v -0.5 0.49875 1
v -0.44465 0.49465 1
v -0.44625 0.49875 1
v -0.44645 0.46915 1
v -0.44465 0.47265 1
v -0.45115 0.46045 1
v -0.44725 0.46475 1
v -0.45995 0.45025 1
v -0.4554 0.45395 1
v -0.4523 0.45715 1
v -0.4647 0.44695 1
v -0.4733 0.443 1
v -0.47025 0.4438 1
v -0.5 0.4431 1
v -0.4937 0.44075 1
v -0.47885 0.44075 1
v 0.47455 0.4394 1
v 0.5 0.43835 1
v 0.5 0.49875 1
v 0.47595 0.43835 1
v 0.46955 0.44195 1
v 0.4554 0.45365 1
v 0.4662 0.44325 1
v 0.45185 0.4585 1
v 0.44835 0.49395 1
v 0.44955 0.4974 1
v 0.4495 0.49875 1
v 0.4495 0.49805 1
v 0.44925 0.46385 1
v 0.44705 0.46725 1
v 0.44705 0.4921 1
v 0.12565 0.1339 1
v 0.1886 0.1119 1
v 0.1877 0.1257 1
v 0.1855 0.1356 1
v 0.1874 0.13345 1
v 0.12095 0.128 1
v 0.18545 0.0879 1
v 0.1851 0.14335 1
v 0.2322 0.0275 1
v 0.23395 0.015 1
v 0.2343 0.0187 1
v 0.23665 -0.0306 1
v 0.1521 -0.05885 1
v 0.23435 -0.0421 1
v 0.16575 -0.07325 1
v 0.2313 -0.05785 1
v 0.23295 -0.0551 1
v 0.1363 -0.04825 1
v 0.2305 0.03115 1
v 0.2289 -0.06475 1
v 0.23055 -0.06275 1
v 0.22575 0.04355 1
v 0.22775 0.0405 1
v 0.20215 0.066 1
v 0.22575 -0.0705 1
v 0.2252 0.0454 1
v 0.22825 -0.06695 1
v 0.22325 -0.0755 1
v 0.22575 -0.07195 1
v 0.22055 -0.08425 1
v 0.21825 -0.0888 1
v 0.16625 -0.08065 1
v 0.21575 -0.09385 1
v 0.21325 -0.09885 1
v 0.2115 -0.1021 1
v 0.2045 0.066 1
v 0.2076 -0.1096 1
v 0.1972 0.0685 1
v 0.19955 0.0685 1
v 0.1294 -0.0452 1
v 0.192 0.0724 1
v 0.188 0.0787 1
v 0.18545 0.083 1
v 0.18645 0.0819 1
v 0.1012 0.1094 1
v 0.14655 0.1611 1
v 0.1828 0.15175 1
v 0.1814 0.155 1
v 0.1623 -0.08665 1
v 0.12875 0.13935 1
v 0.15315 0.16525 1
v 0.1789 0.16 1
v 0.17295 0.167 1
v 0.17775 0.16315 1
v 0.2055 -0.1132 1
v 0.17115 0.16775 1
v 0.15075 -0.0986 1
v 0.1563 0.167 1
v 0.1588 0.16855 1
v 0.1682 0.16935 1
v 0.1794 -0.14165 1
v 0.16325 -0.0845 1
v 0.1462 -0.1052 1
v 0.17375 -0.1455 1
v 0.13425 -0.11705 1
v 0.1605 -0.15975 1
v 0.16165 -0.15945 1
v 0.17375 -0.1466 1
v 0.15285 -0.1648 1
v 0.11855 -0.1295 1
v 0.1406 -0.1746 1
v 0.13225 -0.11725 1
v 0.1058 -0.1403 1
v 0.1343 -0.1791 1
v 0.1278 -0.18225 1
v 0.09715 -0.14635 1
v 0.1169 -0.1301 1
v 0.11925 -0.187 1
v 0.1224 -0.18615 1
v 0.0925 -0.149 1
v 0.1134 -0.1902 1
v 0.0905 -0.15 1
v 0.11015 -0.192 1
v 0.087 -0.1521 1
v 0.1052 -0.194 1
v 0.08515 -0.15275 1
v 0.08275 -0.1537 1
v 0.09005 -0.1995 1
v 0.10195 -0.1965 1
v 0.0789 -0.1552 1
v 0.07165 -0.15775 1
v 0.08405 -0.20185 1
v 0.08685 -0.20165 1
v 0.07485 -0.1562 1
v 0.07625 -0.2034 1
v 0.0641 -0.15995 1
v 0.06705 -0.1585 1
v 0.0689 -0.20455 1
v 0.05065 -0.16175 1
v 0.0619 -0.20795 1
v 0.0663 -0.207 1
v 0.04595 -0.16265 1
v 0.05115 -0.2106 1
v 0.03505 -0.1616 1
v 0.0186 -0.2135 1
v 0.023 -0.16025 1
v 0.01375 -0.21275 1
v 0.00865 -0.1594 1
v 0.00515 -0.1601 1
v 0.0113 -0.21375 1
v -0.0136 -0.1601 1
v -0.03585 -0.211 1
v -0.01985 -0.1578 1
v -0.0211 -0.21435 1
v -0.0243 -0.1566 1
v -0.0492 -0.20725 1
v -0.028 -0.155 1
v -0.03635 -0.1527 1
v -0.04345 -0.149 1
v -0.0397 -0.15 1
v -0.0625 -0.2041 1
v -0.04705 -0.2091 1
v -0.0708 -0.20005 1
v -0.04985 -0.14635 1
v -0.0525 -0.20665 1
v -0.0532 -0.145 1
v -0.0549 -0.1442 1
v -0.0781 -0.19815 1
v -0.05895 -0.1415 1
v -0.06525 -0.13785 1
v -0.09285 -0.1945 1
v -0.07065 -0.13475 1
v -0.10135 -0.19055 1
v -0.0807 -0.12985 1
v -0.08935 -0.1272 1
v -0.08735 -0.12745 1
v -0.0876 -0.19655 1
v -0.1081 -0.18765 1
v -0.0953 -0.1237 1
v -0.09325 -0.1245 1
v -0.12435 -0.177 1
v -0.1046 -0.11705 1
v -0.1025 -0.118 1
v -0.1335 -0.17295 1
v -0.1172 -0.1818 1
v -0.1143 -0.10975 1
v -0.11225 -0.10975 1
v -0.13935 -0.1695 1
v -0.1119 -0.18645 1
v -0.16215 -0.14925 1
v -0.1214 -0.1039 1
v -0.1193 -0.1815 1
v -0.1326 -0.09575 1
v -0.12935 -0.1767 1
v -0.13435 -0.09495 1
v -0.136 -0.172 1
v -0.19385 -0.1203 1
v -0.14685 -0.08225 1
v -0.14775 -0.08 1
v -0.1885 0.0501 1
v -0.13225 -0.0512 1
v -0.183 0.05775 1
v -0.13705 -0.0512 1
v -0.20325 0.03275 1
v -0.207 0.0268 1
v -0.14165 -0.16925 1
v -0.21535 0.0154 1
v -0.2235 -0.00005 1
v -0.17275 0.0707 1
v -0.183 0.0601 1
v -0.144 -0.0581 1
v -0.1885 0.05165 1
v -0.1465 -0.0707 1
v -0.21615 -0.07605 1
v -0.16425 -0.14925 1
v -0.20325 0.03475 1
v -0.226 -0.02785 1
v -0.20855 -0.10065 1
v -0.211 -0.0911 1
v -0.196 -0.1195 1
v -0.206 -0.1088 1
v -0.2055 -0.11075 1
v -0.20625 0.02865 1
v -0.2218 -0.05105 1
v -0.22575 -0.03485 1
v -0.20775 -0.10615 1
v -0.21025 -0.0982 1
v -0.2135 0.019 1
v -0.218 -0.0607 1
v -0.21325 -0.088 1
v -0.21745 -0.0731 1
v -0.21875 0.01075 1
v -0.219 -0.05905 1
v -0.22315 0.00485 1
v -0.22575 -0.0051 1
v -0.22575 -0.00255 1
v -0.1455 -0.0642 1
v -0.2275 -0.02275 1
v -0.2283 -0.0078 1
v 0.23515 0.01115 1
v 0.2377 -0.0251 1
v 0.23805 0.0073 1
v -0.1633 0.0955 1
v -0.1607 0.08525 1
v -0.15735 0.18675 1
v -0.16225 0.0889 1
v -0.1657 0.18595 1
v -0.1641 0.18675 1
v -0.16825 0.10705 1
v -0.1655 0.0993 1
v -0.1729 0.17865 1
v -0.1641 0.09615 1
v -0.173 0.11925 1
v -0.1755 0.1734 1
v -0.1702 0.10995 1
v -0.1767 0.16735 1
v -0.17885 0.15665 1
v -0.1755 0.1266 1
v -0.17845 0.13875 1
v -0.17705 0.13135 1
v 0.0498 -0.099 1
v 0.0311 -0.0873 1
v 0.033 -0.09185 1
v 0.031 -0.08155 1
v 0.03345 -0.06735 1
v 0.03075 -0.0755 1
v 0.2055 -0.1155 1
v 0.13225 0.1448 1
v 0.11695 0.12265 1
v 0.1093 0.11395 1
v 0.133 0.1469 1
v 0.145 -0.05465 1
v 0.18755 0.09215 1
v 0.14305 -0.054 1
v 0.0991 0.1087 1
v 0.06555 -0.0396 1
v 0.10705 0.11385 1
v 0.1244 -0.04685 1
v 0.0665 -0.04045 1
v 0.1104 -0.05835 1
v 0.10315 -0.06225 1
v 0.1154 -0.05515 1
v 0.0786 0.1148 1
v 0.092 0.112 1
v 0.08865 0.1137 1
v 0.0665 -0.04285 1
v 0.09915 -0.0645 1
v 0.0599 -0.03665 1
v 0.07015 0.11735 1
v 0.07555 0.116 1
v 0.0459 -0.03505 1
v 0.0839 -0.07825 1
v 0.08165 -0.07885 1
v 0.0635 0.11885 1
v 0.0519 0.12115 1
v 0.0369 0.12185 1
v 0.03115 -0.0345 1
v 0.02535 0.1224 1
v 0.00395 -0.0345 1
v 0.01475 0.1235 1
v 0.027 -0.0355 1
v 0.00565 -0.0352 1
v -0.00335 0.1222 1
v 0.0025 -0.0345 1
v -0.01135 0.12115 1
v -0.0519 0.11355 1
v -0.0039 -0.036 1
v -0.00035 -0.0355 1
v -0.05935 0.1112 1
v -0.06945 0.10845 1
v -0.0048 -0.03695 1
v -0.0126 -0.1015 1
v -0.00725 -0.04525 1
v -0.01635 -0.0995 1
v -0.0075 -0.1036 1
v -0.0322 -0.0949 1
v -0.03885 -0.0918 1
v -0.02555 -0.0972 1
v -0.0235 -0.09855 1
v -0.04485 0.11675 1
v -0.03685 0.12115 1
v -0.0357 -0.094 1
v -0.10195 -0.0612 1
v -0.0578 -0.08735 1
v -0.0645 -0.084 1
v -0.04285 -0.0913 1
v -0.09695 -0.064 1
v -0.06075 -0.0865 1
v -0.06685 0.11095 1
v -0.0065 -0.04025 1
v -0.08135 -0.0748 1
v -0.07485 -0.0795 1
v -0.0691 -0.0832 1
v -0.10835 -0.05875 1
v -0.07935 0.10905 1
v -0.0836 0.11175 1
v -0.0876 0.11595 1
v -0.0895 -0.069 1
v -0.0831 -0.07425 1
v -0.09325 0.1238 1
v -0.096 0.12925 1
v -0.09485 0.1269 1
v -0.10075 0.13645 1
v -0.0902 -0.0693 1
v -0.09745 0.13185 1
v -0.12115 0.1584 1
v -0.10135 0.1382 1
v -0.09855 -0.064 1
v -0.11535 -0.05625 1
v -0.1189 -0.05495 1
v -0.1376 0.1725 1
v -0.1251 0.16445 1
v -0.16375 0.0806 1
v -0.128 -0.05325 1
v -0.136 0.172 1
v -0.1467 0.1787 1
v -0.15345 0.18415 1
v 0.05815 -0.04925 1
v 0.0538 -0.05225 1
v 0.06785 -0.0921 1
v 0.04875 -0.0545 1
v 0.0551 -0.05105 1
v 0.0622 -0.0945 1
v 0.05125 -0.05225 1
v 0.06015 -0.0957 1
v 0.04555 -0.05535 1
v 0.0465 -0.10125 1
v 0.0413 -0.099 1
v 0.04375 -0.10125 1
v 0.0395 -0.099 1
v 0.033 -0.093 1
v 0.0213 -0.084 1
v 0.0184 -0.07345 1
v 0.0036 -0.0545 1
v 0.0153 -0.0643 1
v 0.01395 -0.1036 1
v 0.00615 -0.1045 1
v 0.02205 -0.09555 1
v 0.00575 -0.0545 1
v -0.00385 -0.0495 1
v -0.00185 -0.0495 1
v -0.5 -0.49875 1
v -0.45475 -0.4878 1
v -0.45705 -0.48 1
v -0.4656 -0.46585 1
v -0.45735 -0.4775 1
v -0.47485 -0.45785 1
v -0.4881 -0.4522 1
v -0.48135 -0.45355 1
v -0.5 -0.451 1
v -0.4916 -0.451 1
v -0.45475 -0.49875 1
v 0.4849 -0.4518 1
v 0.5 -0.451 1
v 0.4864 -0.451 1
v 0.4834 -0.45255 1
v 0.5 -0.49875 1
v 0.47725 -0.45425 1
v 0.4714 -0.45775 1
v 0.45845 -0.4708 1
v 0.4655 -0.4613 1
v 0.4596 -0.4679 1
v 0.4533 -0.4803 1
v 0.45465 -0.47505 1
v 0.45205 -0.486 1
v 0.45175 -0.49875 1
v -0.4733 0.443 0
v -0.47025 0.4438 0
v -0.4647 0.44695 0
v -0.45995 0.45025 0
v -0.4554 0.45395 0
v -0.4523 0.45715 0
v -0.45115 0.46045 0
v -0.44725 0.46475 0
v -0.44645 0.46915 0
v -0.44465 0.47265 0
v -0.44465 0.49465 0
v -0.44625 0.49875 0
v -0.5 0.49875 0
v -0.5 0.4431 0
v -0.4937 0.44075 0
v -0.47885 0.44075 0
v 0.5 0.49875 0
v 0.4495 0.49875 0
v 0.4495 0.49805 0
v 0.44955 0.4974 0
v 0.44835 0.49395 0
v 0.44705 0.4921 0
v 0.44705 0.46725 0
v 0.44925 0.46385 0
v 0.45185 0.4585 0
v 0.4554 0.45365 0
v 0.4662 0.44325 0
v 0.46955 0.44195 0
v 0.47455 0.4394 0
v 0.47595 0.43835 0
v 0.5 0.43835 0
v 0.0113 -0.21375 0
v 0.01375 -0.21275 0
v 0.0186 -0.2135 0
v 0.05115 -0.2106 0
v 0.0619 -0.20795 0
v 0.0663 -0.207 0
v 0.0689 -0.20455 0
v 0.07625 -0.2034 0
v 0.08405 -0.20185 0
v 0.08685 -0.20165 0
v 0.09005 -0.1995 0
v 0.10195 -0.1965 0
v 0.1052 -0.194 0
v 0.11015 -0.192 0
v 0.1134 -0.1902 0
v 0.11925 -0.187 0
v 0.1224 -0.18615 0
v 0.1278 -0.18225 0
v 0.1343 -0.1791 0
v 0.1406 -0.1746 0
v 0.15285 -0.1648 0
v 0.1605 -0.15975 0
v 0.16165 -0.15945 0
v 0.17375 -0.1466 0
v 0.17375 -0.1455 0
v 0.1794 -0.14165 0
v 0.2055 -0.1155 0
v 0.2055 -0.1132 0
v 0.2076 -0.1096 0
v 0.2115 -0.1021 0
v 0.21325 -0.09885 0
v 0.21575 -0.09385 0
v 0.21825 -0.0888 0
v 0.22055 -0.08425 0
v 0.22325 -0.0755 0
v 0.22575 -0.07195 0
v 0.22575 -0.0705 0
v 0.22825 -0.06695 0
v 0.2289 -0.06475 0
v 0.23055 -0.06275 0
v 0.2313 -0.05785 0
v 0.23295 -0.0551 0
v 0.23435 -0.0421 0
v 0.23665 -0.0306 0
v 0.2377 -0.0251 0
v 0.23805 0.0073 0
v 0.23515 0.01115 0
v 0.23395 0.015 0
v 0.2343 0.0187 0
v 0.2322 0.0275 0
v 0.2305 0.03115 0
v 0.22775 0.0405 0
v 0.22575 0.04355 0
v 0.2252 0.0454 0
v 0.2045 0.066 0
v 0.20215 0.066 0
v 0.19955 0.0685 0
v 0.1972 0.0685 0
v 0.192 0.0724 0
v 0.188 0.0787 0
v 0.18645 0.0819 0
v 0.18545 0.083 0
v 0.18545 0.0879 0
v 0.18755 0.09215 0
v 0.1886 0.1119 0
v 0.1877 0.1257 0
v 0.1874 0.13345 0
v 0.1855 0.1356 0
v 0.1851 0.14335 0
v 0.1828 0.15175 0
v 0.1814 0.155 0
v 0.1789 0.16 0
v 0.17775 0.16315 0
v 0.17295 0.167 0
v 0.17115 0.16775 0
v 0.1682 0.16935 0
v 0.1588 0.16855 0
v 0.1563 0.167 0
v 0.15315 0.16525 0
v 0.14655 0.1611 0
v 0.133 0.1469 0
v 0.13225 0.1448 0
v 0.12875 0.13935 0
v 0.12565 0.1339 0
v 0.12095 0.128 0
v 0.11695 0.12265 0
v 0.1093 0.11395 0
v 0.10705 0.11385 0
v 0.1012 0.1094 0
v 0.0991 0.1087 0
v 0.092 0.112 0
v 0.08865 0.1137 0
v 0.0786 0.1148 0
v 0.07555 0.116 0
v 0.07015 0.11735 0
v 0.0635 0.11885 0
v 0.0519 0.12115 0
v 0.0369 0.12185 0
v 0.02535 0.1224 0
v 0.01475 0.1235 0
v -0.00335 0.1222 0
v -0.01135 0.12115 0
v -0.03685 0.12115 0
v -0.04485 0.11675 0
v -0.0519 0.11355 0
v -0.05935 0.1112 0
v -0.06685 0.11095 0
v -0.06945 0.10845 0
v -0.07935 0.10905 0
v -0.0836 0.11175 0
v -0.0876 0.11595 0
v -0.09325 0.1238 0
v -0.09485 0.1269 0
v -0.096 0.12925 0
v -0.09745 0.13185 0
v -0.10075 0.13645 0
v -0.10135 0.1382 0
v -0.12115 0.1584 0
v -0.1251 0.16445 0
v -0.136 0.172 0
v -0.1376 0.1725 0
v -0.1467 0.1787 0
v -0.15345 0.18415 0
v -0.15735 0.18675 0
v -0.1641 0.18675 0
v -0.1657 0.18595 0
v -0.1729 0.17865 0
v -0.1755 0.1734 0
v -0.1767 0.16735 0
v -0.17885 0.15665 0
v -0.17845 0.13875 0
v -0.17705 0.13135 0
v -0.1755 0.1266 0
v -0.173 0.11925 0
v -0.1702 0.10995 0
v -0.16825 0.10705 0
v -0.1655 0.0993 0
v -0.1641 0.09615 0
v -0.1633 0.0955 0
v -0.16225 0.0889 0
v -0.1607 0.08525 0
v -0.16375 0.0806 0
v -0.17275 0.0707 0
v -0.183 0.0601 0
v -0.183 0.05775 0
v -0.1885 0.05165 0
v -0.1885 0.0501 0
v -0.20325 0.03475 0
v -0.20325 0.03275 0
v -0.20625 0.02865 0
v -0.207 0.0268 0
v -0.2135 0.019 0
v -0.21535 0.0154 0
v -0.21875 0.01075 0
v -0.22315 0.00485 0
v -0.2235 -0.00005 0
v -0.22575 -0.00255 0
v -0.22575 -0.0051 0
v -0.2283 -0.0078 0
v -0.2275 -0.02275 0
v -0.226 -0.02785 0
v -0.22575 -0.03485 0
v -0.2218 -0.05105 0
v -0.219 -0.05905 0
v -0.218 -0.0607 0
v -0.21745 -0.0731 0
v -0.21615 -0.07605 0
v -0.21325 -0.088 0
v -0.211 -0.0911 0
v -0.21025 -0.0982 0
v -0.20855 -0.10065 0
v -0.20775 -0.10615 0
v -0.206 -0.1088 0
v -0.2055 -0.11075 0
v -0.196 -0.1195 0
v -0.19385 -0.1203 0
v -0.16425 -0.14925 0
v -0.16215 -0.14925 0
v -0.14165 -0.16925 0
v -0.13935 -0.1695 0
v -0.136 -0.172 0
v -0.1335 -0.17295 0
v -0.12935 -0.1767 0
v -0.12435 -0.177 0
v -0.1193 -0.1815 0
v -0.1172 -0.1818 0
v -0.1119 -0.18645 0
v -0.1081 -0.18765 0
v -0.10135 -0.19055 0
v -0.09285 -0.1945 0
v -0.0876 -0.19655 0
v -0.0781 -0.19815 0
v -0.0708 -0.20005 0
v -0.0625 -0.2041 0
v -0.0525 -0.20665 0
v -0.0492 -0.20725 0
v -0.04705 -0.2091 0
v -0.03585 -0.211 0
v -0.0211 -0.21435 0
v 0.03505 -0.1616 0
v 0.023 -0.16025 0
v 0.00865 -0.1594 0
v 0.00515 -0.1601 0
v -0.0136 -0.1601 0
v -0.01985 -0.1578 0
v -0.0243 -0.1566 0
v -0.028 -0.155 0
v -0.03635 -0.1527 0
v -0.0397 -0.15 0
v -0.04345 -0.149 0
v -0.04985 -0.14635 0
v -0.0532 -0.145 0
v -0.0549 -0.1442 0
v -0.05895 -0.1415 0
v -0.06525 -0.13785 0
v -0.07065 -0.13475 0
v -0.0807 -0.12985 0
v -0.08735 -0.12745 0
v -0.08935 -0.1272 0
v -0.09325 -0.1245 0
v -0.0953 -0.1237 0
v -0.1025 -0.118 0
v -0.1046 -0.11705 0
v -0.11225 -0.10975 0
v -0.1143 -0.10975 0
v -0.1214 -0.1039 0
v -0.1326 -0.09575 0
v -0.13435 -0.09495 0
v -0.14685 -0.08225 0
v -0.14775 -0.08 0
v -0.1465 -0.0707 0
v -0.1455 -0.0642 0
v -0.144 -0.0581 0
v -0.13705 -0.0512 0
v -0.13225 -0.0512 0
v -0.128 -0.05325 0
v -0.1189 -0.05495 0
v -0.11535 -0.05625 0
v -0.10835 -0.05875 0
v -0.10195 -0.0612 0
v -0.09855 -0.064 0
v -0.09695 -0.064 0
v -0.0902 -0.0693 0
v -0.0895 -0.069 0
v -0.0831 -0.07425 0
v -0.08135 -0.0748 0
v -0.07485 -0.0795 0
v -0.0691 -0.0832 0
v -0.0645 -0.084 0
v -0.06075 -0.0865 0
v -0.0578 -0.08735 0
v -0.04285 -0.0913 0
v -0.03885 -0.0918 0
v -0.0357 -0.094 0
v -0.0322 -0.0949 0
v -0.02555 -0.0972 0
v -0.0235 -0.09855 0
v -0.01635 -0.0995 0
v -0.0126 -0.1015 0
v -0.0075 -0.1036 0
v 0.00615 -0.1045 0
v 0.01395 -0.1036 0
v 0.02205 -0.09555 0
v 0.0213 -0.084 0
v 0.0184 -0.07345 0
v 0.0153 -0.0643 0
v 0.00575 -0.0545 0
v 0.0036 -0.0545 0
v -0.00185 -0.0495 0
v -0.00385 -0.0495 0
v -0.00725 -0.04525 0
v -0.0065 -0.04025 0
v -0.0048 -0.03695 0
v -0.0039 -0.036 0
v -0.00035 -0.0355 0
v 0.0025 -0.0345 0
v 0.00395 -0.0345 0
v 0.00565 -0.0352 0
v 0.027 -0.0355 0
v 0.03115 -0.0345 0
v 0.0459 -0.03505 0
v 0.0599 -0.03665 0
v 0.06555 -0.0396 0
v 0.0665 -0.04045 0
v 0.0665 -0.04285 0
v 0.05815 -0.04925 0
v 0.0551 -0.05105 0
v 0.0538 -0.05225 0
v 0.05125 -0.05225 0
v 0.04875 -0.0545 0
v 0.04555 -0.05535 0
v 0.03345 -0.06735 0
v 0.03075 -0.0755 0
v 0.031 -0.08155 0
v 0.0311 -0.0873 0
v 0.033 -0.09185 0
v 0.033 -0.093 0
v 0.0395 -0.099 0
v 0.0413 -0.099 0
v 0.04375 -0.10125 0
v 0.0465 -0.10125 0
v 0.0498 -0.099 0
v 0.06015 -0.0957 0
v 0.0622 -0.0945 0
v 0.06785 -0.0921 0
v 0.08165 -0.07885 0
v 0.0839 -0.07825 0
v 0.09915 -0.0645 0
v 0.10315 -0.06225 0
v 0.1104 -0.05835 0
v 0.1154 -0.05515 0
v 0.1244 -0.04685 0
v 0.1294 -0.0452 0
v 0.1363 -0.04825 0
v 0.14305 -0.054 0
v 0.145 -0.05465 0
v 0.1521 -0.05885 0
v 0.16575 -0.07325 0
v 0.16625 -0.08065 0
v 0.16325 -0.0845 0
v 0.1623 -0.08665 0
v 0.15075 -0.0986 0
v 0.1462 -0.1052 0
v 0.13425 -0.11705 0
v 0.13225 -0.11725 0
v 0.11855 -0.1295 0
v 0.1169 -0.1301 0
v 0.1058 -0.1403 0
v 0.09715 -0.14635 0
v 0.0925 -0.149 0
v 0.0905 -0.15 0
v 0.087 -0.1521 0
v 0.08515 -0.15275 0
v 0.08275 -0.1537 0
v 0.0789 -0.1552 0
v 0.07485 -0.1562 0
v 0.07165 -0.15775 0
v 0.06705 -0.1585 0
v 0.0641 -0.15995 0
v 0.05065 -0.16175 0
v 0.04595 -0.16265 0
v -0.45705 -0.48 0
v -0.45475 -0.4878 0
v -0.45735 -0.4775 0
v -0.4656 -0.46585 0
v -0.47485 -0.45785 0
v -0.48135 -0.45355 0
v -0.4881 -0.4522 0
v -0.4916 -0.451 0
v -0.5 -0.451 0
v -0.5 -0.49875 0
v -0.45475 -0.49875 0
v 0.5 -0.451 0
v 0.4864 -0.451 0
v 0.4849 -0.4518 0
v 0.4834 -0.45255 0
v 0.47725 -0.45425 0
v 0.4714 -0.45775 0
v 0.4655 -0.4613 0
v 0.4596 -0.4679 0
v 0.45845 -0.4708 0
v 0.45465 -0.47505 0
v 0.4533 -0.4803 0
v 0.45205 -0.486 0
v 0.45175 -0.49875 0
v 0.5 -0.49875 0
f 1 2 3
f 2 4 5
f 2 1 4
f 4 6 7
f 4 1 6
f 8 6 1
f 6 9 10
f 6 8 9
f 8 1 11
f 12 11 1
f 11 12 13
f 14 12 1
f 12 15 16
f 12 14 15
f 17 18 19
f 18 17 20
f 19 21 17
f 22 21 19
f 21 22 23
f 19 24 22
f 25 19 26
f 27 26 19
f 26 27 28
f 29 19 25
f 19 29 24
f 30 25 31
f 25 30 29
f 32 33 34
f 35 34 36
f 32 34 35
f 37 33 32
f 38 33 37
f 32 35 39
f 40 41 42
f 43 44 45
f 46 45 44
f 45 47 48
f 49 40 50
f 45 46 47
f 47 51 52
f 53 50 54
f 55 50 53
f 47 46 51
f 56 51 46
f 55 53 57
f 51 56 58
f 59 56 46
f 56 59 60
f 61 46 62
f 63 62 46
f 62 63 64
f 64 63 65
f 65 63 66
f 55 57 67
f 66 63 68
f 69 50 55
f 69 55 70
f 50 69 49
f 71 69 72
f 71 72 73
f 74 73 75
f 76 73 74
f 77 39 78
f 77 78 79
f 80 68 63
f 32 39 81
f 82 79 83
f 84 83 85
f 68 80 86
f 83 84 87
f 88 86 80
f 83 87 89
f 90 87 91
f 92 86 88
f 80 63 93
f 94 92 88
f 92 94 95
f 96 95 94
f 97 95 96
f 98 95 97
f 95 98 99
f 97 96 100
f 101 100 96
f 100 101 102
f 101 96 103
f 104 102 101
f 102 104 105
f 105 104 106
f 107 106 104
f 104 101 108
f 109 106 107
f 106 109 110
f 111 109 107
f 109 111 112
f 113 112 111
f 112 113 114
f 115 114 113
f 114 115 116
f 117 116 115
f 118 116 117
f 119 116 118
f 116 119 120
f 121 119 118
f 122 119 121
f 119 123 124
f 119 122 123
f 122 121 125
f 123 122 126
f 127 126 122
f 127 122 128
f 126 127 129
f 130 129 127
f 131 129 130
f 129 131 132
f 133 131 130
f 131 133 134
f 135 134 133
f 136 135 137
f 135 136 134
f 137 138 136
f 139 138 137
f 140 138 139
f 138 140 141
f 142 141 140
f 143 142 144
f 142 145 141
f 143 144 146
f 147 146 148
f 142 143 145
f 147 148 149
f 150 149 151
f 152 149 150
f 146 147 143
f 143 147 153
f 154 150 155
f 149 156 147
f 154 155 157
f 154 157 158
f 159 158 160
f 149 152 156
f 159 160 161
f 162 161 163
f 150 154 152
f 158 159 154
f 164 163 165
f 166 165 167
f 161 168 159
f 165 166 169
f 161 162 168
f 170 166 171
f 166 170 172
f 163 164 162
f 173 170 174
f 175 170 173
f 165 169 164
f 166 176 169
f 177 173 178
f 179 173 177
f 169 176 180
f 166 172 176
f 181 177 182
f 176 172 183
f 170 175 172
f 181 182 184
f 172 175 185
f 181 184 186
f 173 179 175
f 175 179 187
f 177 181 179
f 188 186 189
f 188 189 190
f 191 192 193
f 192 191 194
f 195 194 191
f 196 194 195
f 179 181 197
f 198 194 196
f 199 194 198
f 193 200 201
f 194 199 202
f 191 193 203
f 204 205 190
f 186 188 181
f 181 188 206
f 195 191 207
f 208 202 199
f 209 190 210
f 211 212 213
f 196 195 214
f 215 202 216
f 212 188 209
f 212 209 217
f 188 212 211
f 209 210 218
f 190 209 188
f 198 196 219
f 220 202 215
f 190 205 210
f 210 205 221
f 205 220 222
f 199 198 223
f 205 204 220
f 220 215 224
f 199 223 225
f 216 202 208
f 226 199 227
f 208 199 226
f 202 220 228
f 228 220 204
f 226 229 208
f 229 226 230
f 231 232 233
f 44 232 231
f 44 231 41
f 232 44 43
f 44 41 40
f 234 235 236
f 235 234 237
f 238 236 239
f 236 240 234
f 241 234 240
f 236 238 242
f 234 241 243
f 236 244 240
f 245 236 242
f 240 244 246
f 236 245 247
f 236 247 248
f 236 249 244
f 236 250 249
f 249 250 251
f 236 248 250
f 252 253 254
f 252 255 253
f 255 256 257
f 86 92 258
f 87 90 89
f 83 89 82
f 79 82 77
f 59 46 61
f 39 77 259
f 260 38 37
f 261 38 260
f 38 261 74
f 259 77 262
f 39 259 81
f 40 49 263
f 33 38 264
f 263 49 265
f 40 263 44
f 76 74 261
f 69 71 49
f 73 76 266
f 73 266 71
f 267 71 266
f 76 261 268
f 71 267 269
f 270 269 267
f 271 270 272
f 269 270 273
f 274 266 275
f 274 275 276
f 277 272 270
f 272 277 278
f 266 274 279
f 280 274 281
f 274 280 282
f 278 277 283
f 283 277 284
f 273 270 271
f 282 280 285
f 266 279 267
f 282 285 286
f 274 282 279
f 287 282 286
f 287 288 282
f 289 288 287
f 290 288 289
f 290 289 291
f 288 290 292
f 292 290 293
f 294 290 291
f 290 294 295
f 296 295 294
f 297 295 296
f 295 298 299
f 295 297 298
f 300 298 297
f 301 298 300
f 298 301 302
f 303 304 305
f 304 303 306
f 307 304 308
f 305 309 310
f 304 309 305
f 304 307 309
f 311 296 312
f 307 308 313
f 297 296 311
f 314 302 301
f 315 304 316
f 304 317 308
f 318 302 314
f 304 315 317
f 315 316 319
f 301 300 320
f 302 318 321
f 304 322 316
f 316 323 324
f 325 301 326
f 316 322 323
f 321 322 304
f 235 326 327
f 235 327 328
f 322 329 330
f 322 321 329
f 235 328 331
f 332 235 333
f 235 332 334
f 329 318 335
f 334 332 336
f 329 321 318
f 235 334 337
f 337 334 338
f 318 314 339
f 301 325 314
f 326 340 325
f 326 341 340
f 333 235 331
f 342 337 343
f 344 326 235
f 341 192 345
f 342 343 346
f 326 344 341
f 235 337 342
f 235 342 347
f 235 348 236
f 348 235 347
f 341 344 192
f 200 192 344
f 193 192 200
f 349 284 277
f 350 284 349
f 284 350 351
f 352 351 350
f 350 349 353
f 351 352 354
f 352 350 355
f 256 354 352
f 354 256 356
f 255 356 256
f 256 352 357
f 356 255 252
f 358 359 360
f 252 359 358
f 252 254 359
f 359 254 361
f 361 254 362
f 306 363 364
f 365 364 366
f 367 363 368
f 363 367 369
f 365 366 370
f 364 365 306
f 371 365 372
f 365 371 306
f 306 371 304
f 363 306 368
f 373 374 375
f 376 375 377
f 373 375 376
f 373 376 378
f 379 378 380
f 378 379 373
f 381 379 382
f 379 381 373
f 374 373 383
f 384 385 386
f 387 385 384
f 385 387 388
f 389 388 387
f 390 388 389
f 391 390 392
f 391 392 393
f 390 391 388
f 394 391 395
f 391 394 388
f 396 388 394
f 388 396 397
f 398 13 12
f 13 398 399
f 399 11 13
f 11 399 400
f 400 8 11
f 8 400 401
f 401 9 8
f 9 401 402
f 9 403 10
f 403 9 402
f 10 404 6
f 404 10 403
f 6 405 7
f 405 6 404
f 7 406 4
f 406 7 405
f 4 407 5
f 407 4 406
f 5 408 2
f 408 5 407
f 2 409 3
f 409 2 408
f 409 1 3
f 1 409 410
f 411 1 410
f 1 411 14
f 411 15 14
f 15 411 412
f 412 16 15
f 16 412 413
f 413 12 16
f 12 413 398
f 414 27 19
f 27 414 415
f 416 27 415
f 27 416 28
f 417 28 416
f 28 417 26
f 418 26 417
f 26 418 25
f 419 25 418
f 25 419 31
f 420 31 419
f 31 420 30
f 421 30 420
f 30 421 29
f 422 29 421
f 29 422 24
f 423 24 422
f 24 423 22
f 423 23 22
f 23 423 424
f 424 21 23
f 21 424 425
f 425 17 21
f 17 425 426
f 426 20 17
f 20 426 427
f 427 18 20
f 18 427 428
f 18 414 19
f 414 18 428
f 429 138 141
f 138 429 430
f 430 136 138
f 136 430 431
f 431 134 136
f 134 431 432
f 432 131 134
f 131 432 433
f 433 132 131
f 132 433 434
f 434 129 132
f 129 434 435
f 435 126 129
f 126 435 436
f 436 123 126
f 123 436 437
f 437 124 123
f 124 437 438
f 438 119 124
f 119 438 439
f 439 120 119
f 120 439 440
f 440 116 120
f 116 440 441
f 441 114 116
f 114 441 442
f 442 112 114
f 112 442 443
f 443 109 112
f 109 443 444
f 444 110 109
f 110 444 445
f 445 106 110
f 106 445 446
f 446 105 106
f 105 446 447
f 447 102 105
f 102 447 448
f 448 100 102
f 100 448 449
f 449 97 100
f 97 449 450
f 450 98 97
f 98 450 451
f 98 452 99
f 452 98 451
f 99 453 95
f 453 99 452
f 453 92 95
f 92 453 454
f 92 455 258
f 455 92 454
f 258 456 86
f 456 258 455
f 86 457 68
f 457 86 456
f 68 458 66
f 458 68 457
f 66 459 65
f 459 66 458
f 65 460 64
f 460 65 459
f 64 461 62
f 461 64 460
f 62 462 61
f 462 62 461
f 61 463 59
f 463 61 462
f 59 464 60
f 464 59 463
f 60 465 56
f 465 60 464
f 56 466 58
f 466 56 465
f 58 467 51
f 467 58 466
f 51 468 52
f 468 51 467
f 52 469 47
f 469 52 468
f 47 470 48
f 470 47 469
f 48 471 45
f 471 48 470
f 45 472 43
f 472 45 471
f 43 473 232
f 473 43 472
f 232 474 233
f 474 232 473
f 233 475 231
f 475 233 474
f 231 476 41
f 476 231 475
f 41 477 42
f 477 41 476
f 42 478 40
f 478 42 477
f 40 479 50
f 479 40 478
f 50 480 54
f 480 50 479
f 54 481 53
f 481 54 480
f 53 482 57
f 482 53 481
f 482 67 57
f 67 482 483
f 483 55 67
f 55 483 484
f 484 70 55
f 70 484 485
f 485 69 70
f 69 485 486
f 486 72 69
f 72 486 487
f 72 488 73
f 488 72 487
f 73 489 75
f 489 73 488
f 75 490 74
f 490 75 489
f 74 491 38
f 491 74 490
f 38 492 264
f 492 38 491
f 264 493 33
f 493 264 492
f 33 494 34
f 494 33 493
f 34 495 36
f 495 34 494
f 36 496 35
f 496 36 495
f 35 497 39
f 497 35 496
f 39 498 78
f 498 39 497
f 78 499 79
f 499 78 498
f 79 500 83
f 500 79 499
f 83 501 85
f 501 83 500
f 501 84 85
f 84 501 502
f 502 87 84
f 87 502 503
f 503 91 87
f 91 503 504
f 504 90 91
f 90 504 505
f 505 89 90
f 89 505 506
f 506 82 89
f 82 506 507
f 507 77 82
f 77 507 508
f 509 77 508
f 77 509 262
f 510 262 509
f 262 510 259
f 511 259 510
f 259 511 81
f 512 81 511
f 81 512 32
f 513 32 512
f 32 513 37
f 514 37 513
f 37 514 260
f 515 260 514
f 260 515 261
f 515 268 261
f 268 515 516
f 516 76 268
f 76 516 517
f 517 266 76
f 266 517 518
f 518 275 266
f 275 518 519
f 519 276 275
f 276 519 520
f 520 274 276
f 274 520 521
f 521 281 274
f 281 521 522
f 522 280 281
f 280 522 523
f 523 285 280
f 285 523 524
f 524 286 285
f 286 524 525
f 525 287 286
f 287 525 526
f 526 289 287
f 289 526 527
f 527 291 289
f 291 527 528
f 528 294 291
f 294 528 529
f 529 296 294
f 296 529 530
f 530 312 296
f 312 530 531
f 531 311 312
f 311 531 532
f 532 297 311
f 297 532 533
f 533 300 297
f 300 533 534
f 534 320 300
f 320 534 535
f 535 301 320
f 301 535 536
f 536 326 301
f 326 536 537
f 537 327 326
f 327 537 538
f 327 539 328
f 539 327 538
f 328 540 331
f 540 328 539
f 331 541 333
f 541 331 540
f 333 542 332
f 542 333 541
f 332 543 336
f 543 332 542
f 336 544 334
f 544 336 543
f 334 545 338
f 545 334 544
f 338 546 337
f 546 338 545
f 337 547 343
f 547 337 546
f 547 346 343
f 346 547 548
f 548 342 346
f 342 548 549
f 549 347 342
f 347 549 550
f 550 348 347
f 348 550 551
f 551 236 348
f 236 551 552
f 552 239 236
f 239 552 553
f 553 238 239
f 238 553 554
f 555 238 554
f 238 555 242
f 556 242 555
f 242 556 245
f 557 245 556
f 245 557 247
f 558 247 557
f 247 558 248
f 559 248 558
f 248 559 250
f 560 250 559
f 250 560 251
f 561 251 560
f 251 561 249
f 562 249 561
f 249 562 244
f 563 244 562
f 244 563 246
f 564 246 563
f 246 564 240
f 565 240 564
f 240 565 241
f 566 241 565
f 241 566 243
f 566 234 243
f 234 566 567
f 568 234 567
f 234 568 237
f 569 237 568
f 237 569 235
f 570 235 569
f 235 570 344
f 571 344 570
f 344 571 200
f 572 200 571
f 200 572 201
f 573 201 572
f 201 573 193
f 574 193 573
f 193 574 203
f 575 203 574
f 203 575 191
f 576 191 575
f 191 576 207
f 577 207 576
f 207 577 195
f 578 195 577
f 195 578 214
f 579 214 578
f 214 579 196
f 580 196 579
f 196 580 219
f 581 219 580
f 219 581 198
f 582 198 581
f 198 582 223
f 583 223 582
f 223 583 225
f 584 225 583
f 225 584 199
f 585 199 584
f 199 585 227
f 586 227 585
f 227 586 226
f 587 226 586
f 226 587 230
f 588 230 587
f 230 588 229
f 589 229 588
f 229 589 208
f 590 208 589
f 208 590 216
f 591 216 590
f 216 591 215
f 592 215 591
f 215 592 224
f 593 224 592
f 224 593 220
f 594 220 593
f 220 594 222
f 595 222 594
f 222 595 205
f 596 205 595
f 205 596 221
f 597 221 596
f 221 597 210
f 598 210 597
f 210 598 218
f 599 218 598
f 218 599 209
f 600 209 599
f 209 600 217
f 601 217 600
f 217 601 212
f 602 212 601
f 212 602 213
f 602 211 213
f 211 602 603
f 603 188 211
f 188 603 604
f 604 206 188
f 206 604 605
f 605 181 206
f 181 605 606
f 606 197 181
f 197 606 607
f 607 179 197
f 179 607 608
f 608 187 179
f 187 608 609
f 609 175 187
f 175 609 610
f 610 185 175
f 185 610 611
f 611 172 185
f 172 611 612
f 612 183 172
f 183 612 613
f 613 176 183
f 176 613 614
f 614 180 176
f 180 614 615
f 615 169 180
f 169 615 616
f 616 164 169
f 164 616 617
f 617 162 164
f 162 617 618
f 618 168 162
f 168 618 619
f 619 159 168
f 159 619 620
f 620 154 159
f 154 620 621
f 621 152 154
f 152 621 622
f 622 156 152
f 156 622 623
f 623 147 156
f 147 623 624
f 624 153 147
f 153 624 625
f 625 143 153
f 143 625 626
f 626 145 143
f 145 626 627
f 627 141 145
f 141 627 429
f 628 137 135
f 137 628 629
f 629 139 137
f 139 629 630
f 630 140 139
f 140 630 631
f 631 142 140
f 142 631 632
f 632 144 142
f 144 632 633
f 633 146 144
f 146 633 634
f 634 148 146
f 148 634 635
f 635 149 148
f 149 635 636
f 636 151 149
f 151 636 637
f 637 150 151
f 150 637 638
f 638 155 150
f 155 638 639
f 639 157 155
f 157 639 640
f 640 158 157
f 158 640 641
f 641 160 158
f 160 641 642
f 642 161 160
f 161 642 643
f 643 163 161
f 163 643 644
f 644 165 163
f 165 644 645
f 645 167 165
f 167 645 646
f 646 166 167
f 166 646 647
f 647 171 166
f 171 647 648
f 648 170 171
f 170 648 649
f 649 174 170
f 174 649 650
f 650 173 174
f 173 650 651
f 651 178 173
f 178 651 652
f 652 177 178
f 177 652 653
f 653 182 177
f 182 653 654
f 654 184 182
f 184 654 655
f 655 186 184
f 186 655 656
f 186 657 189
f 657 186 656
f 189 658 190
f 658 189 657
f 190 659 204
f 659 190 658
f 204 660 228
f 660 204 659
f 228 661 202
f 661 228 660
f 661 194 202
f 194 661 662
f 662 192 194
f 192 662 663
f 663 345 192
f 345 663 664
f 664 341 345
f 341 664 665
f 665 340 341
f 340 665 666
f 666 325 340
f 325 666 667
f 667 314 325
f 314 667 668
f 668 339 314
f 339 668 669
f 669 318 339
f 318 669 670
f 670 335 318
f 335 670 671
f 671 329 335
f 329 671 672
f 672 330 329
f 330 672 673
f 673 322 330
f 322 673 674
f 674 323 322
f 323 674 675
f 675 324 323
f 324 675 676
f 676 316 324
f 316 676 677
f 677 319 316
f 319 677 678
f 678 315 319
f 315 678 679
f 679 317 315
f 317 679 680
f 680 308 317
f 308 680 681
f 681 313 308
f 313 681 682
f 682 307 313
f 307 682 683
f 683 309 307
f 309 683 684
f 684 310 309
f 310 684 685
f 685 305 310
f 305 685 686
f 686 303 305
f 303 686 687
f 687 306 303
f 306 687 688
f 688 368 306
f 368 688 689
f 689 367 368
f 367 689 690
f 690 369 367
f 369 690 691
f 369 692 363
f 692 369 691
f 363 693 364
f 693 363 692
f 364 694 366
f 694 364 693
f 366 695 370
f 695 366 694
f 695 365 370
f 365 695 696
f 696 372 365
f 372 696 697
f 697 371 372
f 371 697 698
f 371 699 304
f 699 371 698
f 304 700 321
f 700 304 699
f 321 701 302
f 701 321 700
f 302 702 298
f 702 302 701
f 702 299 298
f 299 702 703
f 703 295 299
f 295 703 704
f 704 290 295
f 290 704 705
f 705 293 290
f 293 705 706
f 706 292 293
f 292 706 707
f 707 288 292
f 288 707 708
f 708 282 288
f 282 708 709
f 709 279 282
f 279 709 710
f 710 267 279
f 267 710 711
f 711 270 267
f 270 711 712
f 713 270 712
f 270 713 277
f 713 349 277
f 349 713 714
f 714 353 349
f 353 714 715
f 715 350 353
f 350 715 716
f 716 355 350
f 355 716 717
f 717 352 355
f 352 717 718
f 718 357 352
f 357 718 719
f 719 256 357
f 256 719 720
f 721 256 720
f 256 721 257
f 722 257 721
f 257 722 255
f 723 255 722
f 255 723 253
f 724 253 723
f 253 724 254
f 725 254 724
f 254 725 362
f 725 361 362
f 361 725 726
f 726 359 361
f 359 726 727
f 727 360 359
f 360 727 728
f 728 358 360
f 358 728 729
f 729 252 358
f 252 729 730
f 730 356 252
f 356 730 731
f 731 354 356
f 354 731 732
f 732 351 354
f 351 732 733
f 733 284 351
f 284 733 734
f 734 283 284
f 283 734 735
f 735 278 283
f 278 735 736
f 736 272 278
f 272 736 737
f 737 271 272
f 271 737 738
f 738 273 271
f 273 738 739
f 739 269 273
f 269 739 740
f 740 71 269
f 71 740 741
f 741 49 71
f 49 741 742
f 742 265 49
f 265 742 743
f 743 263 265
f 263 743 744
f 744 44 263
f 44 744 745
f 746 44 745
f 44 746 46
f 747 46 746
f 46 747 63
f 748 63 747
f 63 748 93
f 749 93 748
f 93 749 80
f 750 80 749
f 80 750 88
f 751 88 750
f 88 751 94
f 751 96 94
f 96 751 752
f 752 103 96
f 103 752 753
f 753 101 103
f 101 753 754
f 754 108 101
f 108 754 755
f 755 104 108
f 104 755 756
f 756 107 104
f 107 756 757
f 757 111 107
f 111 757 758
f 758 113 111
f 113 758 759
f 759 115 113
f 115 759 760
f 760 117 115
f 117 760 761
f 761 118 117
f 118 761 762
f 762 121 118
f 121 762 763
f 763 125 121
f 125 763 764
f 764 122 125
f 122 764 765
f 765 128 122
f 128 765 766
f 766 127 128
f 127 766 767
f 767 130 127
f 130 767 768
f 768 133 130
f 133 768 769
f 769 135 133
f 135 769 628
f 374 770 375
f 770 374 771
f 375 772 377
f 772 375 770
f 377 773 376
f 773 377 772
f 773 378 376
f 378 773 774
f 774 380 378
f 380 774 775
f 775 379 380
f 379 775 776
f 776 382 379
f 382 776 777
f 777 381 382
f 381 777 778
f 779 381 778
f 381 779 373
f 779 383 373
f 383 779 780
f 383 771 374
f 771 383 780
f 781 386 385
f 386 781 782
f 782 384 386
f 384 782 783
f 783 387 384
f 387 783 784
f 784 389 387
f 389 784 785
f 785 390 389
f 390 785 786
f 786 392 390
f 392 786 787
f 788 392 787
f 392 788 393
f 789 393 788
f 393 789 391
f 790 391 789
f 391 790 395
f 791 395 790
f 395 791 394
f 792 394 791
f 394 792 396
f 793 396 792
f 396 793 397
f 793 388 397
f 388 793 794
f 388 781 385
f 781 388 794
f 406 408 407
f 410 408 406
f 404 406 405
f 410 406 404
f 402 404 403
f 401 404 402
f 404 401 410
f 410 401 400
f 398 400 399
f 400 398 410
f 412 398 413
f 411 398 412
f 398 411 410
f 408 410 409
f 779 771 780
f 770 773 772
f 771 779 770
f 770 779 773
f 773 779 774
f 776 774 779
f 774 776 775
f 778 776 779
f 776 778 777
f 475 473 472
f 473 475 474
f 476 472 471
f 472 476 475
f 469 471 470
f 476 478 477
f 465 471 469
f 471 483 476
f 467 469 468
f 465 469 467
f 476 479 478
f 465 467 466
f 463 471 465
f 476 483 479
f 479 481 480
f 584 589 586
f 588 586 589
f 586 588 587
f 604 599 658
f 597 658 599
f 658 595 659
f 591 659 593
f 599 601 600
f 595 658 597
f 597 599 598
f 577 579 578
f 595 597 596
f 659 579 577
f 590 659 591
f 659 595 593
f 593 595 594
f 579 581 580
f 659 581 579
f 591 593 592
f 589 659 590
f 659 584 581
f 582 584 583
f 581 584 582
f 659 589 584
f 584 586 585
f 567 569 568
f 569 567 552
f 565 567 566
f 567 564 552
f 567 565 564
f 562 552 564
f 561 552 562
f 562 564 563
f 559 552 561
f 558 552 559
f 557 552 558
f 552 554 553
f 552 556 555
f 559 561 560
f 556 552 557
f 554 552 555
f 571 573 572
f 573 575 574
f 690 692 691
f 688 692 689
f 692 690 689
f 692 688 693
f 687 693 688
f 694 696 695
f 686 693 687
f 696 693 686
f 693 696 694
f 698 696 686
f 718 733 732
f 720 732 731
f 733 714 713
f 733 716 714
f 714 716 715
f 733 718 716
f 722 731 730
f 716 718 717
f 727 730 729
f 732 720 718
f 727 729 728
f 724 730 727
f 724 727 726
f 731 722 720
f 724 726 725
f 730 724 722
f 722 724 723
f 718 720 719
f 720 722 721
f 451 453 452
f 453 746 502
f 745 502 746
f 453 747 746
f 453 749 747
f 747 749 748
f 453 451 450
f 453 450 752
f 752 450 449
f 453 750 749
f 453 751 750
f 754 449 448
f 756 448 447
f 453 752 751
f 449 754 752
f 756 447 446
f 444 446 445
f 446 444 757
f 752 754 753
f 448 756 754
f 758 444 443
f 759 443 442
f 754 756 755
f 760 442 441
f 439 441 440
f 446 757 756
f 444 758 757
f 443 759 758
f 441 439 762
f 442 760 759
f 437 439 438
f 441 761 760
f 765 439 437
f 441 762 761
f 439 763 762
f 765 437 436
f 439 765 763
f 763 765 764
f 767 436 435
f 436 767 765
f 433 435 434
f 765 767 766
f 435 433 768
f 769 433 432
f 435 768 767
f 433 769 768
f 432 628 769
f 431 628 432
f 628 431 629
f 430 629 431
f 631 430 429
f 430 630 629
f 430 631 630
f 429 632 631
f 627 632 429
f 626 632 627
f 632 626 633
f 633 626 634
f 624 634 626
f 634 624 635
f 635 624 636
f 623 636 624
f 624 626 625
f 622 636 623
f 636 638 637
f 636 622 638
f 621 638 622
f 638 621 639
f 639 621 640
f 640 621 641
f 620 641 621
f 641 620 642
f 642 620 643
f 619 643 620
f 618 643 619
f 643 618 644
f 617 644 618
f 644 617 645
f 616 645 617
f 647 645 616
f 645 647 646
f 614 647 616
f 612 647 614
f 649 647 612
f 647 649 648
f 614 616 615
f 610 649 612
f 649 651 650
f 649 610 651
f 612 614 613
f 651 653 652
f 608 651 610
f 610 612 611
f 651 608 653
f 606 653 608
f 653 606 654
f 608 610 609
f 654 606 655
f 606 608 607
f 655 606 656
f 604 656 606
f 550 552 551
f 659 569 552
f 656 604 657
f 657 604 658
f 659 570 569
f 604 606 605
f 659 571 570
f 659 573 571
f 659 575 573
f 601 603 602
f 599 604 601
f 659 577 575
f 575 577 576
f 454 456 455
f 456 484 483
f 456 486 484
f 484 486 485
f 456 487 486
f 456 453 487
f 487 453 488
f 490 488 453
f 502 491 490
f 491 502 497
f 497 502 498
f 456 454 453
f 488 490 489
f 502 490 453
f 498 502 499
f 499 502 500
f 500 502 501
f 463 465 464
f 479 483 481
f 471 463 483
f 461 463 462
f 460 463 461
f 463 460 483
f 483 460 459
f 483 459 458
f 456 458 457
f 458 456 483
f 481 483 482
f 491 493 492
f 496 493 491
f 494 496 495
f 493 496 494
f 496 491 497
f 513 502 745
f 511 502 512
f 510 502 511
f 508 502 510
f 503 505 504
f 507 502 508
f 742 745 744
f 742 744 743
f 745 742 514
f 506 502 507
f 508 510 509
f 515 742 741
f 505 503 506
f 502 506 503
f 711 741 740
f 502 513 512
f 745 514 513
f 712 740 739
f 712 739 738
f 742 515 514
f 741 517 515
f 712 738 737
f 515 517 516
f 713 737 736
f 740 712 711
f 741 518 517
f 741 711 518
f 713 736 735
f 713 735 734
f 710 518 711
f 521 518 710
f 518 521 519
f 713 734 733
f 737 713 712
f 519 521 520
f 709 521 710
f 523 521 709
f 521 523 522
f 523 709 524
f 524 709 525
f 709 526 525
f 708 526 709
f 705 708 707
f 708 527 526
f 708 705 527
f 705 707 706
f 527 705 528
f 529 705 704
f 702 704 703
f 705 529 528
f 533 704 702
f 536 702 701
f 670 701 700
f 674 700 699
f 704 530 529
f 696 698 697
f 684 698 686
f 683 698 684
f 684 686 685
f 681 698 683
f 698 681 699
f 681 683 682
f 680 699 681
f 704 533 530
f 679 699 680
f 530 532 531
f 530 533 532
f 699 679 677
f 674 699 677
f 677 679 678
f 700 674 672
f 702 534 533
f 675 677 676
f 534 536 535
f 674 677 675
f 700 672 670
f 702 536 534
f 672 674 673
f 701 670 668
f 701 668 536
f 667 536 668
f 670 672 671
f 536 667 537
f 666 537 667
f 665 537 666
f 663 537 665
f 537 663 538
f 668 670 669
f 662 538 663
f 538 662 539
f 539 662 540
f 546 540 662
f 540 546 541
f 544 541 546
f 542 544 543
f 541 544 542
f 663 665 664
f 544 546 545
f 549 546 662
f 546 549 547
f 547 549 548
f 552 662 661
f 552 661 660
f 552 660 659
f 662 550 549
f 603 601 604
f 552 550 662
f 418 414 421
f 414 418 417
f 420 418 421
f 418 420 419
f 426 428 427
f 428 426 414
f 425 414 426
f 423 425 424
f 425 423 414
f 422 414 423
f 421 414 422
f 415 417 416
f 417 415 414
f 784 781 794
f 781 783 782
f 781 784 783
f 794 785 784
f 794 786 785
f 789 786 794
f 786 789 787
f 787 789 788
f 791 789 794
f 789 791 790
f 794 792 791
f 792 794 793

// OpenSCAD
module CatMask_1()
{
 /* Generated by trace2scad version 20150415
    http://aggregate.org/MAKE/TRACE2SCAD/
    Optimized model has 401/1630 original points
 */
 color([0.5, 0.5, 0.5])
 assign(minx=0) /* polygon minx=0 */
 assign(miny=0) /* polygon miny=0 */
 assign(maxx=20000) /* polygon maxx=20000 */
 assign(maxy=19950) /* polygon maxy=19950 */
 assign(dx=maxx-minx)
 assign(dy=maxy-miny)
 assign(maxd=((dx>dy)?dx:dy))
 scale([1/maxd, 1/maxd, 1])
 translate([-minx-dx/2, -miny-dy/2, 0])
 linear_extrude(height=1, convexity=401)
 union() {
  union() {
   polygon([[0,19394],[0,18837],[126,18790],[423,18790],[534,18835],[595,18851],[706,18914],[801,18980],[892,19054],[954,19118],[977,19184],[1055,19270],[1071,19358],[1107,19428],[1107,19868],[1075,19950],[0,19950]], convexity=5);
   polygon([[18990,19936],[18991,19923],[18967,19854],[18941,19817],[18941,19320],[18985,19252],[19037,19145],[19108,19048],[19324,18840],[19391,18814],[19491,18763],[19519,18742],[20000,18742],[20000,19950],[18990,19950]], convexity=7);
   union() {
    difference() {
     polygon([[6702,13702],[6686,13694],[6542,13548],[6490,13443],[6466,13322],[6423,13108],[6431,12750],[6459,12602],[6490,12507],[6540,12360],[6596,12174],[6635,12116],[6690,11961],[6718,11898],[6734,11885],[6755,11753],[6786,11680],[6725,11587],[6545,11389],[6340,11177],[6340,11130],[6230,11008],[6230,10977],[5935,10670],[5935,10630],[5875,10548],[5860,10511],[5730,10355],[5693,10283],[5625,10190],[5537,10072],[5530,9974],[5485,9924],[5485,9873],[5434,9819],[5450,9520],[5480,9418],[5485,9278],[5564,8954],[5620,8794],[5640,8761],[5651,8513],[5677,8454],[5735,8215],[5780,8153],[5795,8011],[5829,7962],[5845,7852],[5880,7799],[5890,7760],[6080,7585],[6123,7569],[6715,6990],[6757,6990],[7167,6590],[7213,6585],[7280,6535],[7330,6516],[7413,6441],[7513,6435],[7614,6345],[7656,6339],[7762,6246],[7838,6222],[7973,6164],[8143,6085],[8248,6044],[8438,6012],[8584,5974],[8750,5893],[8950,5842],[9016,5830],[9059,5793],[9283,5755],[9578,5688],[10226,5700],[10275,5720],[10372,5705],[11023,5763],[11238,5816],[11326,5835],[11378,5884],[11525,5907],[11681,5938],[11737,5942],[11801,5985],[12039,6045],[12104,6095],[12203,6135],[12268,6171],[12385,6235],[12448,6252],[12556,6330],[12686,6393],[12812,6483],[13057,6679],[13210,6780],[13233,6786],[13475,7043],[13475,7065],[13588,7142],[14110,7665],[14110,7711],[14152,7783],[14230,7933],[14265,7998],[14315,8098],[14365,8199],[14411,8290],[14465,8465],[14515,8536],[14515,8565],[14565,8636],[14578,8680],[14611,8720],[14626,8818],[14659,8873],[14687,9133],[14733,9363],[14754,9473],[14761,10121],[14703,10198],[14679,10275],[14686,10349],[14644,10525],[14610,10598],[14555,10785],[14515,10846],[14504,10883],[14090,11295],[14043,11295],[13991,11345],[13944,11345],[13840,11423],[13760,11549],[13729,11613],[13709,11635],[13709,11733],[13751,11818],[13772,12213],[13754,12489],[13748,12644],[13710,12687],[13702,12842],[13656,13010],[13628,13075],[13578,13175],[13555,13238],[13459,13315],[13423,13330],[13364,13362],[13176,13346],[13126,13315],[13063,13280],[12931,13197],[12660,12913],[12645,12871],[12575,12762],[12513,12653],[12419,12535],[12339,12428],[12186,12254],[12141,12252],[12024,12163],[11982,12149],[11840,12215],[11773,12249],[11572,12271],[11511,12295],[11403,12322],[11270,12352],[11038,12398],[10738,12412],[10507,12423],[10295,12445],[9933,12419],[9773,12398],[9263,12398],[9103,12310],[8962,12246],[8813,12199],[8663,12194],[8611,12144],[8413,12156],[8328,12210],[8248,12294],[8135,12451],[8103,12513],[8080,12560],[8051,12612],[7985,12704],[7973,12739],[7577,13143],[7498,13264],[7280,13415],[7248,13425],[7066,13549],[6931,13658],[6853,13710],[6718,13710]], convexity=30);
     polygon([[10096,9278],[10113,9271],[10540,9265],[10623,9285],[10918,9274],[11198,9242],[11311,9183],[11330,9166],[11330,9118],[11163,8990],[11102,8954],[11076,8930],[11025,8930],[10975,8885],[10911,8868],[10669,8628],[10615,8465],[10620,8344],[10622,8229],[10660,8138],[10660,8115],[10790,7995],[10826,7995],[10875,7950],[10930,7950],[10996,7995],[11203,8061],[11244,8085],[11357,8133],[11633,8398],[11678,8410],[11983,8685],[12063,8730],[12208,8808],[12308,8872],[12488,9038],[12588,9071],[12726,9010],[12861,8895],[12900,8882],[13042,8798],[13315,8510],[13325,8362],[13265,8285],[13246,8242],[13015,8003],[12924,7871],[12685,7634],[12645,7630],[12371,7385],[12338,7373],[12116,7169],[11943,7048],[11850,6995],[11810,6975],[11740,6933],[11703,6920],[11655,6901],[11578,6871],[11497,6851],[11433,6820],[11341,6805],[11282,6776],[11013,6740],[10919,6722],[10701,6743],[10460,6770],[10173,6787],[10103,6773],[9728,6773],[9603,6819],[9514,6843],[9440,6875],[9273,6921],[9206,6975],[9131,6995],[9003,7048],[8936,7075],[8902,7091],[8821,7145],[8695,7218],[8587,7280],[8386,7378],[8253,7426],[8213,7431],[8135,7485],[8094,7501],[7950,7615],[7908,7634],[7755,7780],[7714,7780],[7572,7897],[7348,8060],[7313,8076],[7063,8330],[7045,8375],[7070,8561],[7090,8691],[7120,8813],[7259,8951],[7355,8951],[7440,8910],[7622,8876],[7693,8850],[7833,8800],[7961,8751],[8029,8695],[8061,8695],[8196,8589],[8210,8595],[8338,8490],[8373,8479],[8503,8385],[8618,8311],[8710,8295],[8785,8245],[8844,8228],[9143,8149],[9223,8139],[9286,8095],[9356,8077],[9489,8031],[9530,8004],[9673,7985],[9748,7945],[9850,7903],[10123,7885],[10279,7903],[10441,8064],[10426,8295],[10368,8506],[10306,8689],[10115,8885],[10072,8885],[9963,8985],[9923,8985],[9855,9070],[9870,9170],[9904,9236],[9922,9255],[9993,9265],[10050,9285],[10079,9285]], convexity=26);
    }
   }
   polygon([[0,478],[0,0],[905,0],[905,219],[859,375],[853,425],[688,658],[503,818],[373,904],[238,931],[168,955],[0,955]], convexity=5);
   polygon([[19698,939],[19668,924],[19545,890],[19428,820],[19310,749],[19192,617],[19169,559],[19093,474],[19066,369],[19041,255],[19035,0],[20000,0],[20000,955],[19728,955]], convexity=5);
  }
 }
}

module CatMask()
{
 /* all layers combined, scaled to within a 1mm cube */
 scale([1, 1, 1/1])
 difference() {
  union() {
   scale([1,1,2]) translate([0,0,-0.5]) CatMask_1();
  }
  translate([0,0,-2]) cube([2,2,4],center=true);
 }
}
CatMask();
